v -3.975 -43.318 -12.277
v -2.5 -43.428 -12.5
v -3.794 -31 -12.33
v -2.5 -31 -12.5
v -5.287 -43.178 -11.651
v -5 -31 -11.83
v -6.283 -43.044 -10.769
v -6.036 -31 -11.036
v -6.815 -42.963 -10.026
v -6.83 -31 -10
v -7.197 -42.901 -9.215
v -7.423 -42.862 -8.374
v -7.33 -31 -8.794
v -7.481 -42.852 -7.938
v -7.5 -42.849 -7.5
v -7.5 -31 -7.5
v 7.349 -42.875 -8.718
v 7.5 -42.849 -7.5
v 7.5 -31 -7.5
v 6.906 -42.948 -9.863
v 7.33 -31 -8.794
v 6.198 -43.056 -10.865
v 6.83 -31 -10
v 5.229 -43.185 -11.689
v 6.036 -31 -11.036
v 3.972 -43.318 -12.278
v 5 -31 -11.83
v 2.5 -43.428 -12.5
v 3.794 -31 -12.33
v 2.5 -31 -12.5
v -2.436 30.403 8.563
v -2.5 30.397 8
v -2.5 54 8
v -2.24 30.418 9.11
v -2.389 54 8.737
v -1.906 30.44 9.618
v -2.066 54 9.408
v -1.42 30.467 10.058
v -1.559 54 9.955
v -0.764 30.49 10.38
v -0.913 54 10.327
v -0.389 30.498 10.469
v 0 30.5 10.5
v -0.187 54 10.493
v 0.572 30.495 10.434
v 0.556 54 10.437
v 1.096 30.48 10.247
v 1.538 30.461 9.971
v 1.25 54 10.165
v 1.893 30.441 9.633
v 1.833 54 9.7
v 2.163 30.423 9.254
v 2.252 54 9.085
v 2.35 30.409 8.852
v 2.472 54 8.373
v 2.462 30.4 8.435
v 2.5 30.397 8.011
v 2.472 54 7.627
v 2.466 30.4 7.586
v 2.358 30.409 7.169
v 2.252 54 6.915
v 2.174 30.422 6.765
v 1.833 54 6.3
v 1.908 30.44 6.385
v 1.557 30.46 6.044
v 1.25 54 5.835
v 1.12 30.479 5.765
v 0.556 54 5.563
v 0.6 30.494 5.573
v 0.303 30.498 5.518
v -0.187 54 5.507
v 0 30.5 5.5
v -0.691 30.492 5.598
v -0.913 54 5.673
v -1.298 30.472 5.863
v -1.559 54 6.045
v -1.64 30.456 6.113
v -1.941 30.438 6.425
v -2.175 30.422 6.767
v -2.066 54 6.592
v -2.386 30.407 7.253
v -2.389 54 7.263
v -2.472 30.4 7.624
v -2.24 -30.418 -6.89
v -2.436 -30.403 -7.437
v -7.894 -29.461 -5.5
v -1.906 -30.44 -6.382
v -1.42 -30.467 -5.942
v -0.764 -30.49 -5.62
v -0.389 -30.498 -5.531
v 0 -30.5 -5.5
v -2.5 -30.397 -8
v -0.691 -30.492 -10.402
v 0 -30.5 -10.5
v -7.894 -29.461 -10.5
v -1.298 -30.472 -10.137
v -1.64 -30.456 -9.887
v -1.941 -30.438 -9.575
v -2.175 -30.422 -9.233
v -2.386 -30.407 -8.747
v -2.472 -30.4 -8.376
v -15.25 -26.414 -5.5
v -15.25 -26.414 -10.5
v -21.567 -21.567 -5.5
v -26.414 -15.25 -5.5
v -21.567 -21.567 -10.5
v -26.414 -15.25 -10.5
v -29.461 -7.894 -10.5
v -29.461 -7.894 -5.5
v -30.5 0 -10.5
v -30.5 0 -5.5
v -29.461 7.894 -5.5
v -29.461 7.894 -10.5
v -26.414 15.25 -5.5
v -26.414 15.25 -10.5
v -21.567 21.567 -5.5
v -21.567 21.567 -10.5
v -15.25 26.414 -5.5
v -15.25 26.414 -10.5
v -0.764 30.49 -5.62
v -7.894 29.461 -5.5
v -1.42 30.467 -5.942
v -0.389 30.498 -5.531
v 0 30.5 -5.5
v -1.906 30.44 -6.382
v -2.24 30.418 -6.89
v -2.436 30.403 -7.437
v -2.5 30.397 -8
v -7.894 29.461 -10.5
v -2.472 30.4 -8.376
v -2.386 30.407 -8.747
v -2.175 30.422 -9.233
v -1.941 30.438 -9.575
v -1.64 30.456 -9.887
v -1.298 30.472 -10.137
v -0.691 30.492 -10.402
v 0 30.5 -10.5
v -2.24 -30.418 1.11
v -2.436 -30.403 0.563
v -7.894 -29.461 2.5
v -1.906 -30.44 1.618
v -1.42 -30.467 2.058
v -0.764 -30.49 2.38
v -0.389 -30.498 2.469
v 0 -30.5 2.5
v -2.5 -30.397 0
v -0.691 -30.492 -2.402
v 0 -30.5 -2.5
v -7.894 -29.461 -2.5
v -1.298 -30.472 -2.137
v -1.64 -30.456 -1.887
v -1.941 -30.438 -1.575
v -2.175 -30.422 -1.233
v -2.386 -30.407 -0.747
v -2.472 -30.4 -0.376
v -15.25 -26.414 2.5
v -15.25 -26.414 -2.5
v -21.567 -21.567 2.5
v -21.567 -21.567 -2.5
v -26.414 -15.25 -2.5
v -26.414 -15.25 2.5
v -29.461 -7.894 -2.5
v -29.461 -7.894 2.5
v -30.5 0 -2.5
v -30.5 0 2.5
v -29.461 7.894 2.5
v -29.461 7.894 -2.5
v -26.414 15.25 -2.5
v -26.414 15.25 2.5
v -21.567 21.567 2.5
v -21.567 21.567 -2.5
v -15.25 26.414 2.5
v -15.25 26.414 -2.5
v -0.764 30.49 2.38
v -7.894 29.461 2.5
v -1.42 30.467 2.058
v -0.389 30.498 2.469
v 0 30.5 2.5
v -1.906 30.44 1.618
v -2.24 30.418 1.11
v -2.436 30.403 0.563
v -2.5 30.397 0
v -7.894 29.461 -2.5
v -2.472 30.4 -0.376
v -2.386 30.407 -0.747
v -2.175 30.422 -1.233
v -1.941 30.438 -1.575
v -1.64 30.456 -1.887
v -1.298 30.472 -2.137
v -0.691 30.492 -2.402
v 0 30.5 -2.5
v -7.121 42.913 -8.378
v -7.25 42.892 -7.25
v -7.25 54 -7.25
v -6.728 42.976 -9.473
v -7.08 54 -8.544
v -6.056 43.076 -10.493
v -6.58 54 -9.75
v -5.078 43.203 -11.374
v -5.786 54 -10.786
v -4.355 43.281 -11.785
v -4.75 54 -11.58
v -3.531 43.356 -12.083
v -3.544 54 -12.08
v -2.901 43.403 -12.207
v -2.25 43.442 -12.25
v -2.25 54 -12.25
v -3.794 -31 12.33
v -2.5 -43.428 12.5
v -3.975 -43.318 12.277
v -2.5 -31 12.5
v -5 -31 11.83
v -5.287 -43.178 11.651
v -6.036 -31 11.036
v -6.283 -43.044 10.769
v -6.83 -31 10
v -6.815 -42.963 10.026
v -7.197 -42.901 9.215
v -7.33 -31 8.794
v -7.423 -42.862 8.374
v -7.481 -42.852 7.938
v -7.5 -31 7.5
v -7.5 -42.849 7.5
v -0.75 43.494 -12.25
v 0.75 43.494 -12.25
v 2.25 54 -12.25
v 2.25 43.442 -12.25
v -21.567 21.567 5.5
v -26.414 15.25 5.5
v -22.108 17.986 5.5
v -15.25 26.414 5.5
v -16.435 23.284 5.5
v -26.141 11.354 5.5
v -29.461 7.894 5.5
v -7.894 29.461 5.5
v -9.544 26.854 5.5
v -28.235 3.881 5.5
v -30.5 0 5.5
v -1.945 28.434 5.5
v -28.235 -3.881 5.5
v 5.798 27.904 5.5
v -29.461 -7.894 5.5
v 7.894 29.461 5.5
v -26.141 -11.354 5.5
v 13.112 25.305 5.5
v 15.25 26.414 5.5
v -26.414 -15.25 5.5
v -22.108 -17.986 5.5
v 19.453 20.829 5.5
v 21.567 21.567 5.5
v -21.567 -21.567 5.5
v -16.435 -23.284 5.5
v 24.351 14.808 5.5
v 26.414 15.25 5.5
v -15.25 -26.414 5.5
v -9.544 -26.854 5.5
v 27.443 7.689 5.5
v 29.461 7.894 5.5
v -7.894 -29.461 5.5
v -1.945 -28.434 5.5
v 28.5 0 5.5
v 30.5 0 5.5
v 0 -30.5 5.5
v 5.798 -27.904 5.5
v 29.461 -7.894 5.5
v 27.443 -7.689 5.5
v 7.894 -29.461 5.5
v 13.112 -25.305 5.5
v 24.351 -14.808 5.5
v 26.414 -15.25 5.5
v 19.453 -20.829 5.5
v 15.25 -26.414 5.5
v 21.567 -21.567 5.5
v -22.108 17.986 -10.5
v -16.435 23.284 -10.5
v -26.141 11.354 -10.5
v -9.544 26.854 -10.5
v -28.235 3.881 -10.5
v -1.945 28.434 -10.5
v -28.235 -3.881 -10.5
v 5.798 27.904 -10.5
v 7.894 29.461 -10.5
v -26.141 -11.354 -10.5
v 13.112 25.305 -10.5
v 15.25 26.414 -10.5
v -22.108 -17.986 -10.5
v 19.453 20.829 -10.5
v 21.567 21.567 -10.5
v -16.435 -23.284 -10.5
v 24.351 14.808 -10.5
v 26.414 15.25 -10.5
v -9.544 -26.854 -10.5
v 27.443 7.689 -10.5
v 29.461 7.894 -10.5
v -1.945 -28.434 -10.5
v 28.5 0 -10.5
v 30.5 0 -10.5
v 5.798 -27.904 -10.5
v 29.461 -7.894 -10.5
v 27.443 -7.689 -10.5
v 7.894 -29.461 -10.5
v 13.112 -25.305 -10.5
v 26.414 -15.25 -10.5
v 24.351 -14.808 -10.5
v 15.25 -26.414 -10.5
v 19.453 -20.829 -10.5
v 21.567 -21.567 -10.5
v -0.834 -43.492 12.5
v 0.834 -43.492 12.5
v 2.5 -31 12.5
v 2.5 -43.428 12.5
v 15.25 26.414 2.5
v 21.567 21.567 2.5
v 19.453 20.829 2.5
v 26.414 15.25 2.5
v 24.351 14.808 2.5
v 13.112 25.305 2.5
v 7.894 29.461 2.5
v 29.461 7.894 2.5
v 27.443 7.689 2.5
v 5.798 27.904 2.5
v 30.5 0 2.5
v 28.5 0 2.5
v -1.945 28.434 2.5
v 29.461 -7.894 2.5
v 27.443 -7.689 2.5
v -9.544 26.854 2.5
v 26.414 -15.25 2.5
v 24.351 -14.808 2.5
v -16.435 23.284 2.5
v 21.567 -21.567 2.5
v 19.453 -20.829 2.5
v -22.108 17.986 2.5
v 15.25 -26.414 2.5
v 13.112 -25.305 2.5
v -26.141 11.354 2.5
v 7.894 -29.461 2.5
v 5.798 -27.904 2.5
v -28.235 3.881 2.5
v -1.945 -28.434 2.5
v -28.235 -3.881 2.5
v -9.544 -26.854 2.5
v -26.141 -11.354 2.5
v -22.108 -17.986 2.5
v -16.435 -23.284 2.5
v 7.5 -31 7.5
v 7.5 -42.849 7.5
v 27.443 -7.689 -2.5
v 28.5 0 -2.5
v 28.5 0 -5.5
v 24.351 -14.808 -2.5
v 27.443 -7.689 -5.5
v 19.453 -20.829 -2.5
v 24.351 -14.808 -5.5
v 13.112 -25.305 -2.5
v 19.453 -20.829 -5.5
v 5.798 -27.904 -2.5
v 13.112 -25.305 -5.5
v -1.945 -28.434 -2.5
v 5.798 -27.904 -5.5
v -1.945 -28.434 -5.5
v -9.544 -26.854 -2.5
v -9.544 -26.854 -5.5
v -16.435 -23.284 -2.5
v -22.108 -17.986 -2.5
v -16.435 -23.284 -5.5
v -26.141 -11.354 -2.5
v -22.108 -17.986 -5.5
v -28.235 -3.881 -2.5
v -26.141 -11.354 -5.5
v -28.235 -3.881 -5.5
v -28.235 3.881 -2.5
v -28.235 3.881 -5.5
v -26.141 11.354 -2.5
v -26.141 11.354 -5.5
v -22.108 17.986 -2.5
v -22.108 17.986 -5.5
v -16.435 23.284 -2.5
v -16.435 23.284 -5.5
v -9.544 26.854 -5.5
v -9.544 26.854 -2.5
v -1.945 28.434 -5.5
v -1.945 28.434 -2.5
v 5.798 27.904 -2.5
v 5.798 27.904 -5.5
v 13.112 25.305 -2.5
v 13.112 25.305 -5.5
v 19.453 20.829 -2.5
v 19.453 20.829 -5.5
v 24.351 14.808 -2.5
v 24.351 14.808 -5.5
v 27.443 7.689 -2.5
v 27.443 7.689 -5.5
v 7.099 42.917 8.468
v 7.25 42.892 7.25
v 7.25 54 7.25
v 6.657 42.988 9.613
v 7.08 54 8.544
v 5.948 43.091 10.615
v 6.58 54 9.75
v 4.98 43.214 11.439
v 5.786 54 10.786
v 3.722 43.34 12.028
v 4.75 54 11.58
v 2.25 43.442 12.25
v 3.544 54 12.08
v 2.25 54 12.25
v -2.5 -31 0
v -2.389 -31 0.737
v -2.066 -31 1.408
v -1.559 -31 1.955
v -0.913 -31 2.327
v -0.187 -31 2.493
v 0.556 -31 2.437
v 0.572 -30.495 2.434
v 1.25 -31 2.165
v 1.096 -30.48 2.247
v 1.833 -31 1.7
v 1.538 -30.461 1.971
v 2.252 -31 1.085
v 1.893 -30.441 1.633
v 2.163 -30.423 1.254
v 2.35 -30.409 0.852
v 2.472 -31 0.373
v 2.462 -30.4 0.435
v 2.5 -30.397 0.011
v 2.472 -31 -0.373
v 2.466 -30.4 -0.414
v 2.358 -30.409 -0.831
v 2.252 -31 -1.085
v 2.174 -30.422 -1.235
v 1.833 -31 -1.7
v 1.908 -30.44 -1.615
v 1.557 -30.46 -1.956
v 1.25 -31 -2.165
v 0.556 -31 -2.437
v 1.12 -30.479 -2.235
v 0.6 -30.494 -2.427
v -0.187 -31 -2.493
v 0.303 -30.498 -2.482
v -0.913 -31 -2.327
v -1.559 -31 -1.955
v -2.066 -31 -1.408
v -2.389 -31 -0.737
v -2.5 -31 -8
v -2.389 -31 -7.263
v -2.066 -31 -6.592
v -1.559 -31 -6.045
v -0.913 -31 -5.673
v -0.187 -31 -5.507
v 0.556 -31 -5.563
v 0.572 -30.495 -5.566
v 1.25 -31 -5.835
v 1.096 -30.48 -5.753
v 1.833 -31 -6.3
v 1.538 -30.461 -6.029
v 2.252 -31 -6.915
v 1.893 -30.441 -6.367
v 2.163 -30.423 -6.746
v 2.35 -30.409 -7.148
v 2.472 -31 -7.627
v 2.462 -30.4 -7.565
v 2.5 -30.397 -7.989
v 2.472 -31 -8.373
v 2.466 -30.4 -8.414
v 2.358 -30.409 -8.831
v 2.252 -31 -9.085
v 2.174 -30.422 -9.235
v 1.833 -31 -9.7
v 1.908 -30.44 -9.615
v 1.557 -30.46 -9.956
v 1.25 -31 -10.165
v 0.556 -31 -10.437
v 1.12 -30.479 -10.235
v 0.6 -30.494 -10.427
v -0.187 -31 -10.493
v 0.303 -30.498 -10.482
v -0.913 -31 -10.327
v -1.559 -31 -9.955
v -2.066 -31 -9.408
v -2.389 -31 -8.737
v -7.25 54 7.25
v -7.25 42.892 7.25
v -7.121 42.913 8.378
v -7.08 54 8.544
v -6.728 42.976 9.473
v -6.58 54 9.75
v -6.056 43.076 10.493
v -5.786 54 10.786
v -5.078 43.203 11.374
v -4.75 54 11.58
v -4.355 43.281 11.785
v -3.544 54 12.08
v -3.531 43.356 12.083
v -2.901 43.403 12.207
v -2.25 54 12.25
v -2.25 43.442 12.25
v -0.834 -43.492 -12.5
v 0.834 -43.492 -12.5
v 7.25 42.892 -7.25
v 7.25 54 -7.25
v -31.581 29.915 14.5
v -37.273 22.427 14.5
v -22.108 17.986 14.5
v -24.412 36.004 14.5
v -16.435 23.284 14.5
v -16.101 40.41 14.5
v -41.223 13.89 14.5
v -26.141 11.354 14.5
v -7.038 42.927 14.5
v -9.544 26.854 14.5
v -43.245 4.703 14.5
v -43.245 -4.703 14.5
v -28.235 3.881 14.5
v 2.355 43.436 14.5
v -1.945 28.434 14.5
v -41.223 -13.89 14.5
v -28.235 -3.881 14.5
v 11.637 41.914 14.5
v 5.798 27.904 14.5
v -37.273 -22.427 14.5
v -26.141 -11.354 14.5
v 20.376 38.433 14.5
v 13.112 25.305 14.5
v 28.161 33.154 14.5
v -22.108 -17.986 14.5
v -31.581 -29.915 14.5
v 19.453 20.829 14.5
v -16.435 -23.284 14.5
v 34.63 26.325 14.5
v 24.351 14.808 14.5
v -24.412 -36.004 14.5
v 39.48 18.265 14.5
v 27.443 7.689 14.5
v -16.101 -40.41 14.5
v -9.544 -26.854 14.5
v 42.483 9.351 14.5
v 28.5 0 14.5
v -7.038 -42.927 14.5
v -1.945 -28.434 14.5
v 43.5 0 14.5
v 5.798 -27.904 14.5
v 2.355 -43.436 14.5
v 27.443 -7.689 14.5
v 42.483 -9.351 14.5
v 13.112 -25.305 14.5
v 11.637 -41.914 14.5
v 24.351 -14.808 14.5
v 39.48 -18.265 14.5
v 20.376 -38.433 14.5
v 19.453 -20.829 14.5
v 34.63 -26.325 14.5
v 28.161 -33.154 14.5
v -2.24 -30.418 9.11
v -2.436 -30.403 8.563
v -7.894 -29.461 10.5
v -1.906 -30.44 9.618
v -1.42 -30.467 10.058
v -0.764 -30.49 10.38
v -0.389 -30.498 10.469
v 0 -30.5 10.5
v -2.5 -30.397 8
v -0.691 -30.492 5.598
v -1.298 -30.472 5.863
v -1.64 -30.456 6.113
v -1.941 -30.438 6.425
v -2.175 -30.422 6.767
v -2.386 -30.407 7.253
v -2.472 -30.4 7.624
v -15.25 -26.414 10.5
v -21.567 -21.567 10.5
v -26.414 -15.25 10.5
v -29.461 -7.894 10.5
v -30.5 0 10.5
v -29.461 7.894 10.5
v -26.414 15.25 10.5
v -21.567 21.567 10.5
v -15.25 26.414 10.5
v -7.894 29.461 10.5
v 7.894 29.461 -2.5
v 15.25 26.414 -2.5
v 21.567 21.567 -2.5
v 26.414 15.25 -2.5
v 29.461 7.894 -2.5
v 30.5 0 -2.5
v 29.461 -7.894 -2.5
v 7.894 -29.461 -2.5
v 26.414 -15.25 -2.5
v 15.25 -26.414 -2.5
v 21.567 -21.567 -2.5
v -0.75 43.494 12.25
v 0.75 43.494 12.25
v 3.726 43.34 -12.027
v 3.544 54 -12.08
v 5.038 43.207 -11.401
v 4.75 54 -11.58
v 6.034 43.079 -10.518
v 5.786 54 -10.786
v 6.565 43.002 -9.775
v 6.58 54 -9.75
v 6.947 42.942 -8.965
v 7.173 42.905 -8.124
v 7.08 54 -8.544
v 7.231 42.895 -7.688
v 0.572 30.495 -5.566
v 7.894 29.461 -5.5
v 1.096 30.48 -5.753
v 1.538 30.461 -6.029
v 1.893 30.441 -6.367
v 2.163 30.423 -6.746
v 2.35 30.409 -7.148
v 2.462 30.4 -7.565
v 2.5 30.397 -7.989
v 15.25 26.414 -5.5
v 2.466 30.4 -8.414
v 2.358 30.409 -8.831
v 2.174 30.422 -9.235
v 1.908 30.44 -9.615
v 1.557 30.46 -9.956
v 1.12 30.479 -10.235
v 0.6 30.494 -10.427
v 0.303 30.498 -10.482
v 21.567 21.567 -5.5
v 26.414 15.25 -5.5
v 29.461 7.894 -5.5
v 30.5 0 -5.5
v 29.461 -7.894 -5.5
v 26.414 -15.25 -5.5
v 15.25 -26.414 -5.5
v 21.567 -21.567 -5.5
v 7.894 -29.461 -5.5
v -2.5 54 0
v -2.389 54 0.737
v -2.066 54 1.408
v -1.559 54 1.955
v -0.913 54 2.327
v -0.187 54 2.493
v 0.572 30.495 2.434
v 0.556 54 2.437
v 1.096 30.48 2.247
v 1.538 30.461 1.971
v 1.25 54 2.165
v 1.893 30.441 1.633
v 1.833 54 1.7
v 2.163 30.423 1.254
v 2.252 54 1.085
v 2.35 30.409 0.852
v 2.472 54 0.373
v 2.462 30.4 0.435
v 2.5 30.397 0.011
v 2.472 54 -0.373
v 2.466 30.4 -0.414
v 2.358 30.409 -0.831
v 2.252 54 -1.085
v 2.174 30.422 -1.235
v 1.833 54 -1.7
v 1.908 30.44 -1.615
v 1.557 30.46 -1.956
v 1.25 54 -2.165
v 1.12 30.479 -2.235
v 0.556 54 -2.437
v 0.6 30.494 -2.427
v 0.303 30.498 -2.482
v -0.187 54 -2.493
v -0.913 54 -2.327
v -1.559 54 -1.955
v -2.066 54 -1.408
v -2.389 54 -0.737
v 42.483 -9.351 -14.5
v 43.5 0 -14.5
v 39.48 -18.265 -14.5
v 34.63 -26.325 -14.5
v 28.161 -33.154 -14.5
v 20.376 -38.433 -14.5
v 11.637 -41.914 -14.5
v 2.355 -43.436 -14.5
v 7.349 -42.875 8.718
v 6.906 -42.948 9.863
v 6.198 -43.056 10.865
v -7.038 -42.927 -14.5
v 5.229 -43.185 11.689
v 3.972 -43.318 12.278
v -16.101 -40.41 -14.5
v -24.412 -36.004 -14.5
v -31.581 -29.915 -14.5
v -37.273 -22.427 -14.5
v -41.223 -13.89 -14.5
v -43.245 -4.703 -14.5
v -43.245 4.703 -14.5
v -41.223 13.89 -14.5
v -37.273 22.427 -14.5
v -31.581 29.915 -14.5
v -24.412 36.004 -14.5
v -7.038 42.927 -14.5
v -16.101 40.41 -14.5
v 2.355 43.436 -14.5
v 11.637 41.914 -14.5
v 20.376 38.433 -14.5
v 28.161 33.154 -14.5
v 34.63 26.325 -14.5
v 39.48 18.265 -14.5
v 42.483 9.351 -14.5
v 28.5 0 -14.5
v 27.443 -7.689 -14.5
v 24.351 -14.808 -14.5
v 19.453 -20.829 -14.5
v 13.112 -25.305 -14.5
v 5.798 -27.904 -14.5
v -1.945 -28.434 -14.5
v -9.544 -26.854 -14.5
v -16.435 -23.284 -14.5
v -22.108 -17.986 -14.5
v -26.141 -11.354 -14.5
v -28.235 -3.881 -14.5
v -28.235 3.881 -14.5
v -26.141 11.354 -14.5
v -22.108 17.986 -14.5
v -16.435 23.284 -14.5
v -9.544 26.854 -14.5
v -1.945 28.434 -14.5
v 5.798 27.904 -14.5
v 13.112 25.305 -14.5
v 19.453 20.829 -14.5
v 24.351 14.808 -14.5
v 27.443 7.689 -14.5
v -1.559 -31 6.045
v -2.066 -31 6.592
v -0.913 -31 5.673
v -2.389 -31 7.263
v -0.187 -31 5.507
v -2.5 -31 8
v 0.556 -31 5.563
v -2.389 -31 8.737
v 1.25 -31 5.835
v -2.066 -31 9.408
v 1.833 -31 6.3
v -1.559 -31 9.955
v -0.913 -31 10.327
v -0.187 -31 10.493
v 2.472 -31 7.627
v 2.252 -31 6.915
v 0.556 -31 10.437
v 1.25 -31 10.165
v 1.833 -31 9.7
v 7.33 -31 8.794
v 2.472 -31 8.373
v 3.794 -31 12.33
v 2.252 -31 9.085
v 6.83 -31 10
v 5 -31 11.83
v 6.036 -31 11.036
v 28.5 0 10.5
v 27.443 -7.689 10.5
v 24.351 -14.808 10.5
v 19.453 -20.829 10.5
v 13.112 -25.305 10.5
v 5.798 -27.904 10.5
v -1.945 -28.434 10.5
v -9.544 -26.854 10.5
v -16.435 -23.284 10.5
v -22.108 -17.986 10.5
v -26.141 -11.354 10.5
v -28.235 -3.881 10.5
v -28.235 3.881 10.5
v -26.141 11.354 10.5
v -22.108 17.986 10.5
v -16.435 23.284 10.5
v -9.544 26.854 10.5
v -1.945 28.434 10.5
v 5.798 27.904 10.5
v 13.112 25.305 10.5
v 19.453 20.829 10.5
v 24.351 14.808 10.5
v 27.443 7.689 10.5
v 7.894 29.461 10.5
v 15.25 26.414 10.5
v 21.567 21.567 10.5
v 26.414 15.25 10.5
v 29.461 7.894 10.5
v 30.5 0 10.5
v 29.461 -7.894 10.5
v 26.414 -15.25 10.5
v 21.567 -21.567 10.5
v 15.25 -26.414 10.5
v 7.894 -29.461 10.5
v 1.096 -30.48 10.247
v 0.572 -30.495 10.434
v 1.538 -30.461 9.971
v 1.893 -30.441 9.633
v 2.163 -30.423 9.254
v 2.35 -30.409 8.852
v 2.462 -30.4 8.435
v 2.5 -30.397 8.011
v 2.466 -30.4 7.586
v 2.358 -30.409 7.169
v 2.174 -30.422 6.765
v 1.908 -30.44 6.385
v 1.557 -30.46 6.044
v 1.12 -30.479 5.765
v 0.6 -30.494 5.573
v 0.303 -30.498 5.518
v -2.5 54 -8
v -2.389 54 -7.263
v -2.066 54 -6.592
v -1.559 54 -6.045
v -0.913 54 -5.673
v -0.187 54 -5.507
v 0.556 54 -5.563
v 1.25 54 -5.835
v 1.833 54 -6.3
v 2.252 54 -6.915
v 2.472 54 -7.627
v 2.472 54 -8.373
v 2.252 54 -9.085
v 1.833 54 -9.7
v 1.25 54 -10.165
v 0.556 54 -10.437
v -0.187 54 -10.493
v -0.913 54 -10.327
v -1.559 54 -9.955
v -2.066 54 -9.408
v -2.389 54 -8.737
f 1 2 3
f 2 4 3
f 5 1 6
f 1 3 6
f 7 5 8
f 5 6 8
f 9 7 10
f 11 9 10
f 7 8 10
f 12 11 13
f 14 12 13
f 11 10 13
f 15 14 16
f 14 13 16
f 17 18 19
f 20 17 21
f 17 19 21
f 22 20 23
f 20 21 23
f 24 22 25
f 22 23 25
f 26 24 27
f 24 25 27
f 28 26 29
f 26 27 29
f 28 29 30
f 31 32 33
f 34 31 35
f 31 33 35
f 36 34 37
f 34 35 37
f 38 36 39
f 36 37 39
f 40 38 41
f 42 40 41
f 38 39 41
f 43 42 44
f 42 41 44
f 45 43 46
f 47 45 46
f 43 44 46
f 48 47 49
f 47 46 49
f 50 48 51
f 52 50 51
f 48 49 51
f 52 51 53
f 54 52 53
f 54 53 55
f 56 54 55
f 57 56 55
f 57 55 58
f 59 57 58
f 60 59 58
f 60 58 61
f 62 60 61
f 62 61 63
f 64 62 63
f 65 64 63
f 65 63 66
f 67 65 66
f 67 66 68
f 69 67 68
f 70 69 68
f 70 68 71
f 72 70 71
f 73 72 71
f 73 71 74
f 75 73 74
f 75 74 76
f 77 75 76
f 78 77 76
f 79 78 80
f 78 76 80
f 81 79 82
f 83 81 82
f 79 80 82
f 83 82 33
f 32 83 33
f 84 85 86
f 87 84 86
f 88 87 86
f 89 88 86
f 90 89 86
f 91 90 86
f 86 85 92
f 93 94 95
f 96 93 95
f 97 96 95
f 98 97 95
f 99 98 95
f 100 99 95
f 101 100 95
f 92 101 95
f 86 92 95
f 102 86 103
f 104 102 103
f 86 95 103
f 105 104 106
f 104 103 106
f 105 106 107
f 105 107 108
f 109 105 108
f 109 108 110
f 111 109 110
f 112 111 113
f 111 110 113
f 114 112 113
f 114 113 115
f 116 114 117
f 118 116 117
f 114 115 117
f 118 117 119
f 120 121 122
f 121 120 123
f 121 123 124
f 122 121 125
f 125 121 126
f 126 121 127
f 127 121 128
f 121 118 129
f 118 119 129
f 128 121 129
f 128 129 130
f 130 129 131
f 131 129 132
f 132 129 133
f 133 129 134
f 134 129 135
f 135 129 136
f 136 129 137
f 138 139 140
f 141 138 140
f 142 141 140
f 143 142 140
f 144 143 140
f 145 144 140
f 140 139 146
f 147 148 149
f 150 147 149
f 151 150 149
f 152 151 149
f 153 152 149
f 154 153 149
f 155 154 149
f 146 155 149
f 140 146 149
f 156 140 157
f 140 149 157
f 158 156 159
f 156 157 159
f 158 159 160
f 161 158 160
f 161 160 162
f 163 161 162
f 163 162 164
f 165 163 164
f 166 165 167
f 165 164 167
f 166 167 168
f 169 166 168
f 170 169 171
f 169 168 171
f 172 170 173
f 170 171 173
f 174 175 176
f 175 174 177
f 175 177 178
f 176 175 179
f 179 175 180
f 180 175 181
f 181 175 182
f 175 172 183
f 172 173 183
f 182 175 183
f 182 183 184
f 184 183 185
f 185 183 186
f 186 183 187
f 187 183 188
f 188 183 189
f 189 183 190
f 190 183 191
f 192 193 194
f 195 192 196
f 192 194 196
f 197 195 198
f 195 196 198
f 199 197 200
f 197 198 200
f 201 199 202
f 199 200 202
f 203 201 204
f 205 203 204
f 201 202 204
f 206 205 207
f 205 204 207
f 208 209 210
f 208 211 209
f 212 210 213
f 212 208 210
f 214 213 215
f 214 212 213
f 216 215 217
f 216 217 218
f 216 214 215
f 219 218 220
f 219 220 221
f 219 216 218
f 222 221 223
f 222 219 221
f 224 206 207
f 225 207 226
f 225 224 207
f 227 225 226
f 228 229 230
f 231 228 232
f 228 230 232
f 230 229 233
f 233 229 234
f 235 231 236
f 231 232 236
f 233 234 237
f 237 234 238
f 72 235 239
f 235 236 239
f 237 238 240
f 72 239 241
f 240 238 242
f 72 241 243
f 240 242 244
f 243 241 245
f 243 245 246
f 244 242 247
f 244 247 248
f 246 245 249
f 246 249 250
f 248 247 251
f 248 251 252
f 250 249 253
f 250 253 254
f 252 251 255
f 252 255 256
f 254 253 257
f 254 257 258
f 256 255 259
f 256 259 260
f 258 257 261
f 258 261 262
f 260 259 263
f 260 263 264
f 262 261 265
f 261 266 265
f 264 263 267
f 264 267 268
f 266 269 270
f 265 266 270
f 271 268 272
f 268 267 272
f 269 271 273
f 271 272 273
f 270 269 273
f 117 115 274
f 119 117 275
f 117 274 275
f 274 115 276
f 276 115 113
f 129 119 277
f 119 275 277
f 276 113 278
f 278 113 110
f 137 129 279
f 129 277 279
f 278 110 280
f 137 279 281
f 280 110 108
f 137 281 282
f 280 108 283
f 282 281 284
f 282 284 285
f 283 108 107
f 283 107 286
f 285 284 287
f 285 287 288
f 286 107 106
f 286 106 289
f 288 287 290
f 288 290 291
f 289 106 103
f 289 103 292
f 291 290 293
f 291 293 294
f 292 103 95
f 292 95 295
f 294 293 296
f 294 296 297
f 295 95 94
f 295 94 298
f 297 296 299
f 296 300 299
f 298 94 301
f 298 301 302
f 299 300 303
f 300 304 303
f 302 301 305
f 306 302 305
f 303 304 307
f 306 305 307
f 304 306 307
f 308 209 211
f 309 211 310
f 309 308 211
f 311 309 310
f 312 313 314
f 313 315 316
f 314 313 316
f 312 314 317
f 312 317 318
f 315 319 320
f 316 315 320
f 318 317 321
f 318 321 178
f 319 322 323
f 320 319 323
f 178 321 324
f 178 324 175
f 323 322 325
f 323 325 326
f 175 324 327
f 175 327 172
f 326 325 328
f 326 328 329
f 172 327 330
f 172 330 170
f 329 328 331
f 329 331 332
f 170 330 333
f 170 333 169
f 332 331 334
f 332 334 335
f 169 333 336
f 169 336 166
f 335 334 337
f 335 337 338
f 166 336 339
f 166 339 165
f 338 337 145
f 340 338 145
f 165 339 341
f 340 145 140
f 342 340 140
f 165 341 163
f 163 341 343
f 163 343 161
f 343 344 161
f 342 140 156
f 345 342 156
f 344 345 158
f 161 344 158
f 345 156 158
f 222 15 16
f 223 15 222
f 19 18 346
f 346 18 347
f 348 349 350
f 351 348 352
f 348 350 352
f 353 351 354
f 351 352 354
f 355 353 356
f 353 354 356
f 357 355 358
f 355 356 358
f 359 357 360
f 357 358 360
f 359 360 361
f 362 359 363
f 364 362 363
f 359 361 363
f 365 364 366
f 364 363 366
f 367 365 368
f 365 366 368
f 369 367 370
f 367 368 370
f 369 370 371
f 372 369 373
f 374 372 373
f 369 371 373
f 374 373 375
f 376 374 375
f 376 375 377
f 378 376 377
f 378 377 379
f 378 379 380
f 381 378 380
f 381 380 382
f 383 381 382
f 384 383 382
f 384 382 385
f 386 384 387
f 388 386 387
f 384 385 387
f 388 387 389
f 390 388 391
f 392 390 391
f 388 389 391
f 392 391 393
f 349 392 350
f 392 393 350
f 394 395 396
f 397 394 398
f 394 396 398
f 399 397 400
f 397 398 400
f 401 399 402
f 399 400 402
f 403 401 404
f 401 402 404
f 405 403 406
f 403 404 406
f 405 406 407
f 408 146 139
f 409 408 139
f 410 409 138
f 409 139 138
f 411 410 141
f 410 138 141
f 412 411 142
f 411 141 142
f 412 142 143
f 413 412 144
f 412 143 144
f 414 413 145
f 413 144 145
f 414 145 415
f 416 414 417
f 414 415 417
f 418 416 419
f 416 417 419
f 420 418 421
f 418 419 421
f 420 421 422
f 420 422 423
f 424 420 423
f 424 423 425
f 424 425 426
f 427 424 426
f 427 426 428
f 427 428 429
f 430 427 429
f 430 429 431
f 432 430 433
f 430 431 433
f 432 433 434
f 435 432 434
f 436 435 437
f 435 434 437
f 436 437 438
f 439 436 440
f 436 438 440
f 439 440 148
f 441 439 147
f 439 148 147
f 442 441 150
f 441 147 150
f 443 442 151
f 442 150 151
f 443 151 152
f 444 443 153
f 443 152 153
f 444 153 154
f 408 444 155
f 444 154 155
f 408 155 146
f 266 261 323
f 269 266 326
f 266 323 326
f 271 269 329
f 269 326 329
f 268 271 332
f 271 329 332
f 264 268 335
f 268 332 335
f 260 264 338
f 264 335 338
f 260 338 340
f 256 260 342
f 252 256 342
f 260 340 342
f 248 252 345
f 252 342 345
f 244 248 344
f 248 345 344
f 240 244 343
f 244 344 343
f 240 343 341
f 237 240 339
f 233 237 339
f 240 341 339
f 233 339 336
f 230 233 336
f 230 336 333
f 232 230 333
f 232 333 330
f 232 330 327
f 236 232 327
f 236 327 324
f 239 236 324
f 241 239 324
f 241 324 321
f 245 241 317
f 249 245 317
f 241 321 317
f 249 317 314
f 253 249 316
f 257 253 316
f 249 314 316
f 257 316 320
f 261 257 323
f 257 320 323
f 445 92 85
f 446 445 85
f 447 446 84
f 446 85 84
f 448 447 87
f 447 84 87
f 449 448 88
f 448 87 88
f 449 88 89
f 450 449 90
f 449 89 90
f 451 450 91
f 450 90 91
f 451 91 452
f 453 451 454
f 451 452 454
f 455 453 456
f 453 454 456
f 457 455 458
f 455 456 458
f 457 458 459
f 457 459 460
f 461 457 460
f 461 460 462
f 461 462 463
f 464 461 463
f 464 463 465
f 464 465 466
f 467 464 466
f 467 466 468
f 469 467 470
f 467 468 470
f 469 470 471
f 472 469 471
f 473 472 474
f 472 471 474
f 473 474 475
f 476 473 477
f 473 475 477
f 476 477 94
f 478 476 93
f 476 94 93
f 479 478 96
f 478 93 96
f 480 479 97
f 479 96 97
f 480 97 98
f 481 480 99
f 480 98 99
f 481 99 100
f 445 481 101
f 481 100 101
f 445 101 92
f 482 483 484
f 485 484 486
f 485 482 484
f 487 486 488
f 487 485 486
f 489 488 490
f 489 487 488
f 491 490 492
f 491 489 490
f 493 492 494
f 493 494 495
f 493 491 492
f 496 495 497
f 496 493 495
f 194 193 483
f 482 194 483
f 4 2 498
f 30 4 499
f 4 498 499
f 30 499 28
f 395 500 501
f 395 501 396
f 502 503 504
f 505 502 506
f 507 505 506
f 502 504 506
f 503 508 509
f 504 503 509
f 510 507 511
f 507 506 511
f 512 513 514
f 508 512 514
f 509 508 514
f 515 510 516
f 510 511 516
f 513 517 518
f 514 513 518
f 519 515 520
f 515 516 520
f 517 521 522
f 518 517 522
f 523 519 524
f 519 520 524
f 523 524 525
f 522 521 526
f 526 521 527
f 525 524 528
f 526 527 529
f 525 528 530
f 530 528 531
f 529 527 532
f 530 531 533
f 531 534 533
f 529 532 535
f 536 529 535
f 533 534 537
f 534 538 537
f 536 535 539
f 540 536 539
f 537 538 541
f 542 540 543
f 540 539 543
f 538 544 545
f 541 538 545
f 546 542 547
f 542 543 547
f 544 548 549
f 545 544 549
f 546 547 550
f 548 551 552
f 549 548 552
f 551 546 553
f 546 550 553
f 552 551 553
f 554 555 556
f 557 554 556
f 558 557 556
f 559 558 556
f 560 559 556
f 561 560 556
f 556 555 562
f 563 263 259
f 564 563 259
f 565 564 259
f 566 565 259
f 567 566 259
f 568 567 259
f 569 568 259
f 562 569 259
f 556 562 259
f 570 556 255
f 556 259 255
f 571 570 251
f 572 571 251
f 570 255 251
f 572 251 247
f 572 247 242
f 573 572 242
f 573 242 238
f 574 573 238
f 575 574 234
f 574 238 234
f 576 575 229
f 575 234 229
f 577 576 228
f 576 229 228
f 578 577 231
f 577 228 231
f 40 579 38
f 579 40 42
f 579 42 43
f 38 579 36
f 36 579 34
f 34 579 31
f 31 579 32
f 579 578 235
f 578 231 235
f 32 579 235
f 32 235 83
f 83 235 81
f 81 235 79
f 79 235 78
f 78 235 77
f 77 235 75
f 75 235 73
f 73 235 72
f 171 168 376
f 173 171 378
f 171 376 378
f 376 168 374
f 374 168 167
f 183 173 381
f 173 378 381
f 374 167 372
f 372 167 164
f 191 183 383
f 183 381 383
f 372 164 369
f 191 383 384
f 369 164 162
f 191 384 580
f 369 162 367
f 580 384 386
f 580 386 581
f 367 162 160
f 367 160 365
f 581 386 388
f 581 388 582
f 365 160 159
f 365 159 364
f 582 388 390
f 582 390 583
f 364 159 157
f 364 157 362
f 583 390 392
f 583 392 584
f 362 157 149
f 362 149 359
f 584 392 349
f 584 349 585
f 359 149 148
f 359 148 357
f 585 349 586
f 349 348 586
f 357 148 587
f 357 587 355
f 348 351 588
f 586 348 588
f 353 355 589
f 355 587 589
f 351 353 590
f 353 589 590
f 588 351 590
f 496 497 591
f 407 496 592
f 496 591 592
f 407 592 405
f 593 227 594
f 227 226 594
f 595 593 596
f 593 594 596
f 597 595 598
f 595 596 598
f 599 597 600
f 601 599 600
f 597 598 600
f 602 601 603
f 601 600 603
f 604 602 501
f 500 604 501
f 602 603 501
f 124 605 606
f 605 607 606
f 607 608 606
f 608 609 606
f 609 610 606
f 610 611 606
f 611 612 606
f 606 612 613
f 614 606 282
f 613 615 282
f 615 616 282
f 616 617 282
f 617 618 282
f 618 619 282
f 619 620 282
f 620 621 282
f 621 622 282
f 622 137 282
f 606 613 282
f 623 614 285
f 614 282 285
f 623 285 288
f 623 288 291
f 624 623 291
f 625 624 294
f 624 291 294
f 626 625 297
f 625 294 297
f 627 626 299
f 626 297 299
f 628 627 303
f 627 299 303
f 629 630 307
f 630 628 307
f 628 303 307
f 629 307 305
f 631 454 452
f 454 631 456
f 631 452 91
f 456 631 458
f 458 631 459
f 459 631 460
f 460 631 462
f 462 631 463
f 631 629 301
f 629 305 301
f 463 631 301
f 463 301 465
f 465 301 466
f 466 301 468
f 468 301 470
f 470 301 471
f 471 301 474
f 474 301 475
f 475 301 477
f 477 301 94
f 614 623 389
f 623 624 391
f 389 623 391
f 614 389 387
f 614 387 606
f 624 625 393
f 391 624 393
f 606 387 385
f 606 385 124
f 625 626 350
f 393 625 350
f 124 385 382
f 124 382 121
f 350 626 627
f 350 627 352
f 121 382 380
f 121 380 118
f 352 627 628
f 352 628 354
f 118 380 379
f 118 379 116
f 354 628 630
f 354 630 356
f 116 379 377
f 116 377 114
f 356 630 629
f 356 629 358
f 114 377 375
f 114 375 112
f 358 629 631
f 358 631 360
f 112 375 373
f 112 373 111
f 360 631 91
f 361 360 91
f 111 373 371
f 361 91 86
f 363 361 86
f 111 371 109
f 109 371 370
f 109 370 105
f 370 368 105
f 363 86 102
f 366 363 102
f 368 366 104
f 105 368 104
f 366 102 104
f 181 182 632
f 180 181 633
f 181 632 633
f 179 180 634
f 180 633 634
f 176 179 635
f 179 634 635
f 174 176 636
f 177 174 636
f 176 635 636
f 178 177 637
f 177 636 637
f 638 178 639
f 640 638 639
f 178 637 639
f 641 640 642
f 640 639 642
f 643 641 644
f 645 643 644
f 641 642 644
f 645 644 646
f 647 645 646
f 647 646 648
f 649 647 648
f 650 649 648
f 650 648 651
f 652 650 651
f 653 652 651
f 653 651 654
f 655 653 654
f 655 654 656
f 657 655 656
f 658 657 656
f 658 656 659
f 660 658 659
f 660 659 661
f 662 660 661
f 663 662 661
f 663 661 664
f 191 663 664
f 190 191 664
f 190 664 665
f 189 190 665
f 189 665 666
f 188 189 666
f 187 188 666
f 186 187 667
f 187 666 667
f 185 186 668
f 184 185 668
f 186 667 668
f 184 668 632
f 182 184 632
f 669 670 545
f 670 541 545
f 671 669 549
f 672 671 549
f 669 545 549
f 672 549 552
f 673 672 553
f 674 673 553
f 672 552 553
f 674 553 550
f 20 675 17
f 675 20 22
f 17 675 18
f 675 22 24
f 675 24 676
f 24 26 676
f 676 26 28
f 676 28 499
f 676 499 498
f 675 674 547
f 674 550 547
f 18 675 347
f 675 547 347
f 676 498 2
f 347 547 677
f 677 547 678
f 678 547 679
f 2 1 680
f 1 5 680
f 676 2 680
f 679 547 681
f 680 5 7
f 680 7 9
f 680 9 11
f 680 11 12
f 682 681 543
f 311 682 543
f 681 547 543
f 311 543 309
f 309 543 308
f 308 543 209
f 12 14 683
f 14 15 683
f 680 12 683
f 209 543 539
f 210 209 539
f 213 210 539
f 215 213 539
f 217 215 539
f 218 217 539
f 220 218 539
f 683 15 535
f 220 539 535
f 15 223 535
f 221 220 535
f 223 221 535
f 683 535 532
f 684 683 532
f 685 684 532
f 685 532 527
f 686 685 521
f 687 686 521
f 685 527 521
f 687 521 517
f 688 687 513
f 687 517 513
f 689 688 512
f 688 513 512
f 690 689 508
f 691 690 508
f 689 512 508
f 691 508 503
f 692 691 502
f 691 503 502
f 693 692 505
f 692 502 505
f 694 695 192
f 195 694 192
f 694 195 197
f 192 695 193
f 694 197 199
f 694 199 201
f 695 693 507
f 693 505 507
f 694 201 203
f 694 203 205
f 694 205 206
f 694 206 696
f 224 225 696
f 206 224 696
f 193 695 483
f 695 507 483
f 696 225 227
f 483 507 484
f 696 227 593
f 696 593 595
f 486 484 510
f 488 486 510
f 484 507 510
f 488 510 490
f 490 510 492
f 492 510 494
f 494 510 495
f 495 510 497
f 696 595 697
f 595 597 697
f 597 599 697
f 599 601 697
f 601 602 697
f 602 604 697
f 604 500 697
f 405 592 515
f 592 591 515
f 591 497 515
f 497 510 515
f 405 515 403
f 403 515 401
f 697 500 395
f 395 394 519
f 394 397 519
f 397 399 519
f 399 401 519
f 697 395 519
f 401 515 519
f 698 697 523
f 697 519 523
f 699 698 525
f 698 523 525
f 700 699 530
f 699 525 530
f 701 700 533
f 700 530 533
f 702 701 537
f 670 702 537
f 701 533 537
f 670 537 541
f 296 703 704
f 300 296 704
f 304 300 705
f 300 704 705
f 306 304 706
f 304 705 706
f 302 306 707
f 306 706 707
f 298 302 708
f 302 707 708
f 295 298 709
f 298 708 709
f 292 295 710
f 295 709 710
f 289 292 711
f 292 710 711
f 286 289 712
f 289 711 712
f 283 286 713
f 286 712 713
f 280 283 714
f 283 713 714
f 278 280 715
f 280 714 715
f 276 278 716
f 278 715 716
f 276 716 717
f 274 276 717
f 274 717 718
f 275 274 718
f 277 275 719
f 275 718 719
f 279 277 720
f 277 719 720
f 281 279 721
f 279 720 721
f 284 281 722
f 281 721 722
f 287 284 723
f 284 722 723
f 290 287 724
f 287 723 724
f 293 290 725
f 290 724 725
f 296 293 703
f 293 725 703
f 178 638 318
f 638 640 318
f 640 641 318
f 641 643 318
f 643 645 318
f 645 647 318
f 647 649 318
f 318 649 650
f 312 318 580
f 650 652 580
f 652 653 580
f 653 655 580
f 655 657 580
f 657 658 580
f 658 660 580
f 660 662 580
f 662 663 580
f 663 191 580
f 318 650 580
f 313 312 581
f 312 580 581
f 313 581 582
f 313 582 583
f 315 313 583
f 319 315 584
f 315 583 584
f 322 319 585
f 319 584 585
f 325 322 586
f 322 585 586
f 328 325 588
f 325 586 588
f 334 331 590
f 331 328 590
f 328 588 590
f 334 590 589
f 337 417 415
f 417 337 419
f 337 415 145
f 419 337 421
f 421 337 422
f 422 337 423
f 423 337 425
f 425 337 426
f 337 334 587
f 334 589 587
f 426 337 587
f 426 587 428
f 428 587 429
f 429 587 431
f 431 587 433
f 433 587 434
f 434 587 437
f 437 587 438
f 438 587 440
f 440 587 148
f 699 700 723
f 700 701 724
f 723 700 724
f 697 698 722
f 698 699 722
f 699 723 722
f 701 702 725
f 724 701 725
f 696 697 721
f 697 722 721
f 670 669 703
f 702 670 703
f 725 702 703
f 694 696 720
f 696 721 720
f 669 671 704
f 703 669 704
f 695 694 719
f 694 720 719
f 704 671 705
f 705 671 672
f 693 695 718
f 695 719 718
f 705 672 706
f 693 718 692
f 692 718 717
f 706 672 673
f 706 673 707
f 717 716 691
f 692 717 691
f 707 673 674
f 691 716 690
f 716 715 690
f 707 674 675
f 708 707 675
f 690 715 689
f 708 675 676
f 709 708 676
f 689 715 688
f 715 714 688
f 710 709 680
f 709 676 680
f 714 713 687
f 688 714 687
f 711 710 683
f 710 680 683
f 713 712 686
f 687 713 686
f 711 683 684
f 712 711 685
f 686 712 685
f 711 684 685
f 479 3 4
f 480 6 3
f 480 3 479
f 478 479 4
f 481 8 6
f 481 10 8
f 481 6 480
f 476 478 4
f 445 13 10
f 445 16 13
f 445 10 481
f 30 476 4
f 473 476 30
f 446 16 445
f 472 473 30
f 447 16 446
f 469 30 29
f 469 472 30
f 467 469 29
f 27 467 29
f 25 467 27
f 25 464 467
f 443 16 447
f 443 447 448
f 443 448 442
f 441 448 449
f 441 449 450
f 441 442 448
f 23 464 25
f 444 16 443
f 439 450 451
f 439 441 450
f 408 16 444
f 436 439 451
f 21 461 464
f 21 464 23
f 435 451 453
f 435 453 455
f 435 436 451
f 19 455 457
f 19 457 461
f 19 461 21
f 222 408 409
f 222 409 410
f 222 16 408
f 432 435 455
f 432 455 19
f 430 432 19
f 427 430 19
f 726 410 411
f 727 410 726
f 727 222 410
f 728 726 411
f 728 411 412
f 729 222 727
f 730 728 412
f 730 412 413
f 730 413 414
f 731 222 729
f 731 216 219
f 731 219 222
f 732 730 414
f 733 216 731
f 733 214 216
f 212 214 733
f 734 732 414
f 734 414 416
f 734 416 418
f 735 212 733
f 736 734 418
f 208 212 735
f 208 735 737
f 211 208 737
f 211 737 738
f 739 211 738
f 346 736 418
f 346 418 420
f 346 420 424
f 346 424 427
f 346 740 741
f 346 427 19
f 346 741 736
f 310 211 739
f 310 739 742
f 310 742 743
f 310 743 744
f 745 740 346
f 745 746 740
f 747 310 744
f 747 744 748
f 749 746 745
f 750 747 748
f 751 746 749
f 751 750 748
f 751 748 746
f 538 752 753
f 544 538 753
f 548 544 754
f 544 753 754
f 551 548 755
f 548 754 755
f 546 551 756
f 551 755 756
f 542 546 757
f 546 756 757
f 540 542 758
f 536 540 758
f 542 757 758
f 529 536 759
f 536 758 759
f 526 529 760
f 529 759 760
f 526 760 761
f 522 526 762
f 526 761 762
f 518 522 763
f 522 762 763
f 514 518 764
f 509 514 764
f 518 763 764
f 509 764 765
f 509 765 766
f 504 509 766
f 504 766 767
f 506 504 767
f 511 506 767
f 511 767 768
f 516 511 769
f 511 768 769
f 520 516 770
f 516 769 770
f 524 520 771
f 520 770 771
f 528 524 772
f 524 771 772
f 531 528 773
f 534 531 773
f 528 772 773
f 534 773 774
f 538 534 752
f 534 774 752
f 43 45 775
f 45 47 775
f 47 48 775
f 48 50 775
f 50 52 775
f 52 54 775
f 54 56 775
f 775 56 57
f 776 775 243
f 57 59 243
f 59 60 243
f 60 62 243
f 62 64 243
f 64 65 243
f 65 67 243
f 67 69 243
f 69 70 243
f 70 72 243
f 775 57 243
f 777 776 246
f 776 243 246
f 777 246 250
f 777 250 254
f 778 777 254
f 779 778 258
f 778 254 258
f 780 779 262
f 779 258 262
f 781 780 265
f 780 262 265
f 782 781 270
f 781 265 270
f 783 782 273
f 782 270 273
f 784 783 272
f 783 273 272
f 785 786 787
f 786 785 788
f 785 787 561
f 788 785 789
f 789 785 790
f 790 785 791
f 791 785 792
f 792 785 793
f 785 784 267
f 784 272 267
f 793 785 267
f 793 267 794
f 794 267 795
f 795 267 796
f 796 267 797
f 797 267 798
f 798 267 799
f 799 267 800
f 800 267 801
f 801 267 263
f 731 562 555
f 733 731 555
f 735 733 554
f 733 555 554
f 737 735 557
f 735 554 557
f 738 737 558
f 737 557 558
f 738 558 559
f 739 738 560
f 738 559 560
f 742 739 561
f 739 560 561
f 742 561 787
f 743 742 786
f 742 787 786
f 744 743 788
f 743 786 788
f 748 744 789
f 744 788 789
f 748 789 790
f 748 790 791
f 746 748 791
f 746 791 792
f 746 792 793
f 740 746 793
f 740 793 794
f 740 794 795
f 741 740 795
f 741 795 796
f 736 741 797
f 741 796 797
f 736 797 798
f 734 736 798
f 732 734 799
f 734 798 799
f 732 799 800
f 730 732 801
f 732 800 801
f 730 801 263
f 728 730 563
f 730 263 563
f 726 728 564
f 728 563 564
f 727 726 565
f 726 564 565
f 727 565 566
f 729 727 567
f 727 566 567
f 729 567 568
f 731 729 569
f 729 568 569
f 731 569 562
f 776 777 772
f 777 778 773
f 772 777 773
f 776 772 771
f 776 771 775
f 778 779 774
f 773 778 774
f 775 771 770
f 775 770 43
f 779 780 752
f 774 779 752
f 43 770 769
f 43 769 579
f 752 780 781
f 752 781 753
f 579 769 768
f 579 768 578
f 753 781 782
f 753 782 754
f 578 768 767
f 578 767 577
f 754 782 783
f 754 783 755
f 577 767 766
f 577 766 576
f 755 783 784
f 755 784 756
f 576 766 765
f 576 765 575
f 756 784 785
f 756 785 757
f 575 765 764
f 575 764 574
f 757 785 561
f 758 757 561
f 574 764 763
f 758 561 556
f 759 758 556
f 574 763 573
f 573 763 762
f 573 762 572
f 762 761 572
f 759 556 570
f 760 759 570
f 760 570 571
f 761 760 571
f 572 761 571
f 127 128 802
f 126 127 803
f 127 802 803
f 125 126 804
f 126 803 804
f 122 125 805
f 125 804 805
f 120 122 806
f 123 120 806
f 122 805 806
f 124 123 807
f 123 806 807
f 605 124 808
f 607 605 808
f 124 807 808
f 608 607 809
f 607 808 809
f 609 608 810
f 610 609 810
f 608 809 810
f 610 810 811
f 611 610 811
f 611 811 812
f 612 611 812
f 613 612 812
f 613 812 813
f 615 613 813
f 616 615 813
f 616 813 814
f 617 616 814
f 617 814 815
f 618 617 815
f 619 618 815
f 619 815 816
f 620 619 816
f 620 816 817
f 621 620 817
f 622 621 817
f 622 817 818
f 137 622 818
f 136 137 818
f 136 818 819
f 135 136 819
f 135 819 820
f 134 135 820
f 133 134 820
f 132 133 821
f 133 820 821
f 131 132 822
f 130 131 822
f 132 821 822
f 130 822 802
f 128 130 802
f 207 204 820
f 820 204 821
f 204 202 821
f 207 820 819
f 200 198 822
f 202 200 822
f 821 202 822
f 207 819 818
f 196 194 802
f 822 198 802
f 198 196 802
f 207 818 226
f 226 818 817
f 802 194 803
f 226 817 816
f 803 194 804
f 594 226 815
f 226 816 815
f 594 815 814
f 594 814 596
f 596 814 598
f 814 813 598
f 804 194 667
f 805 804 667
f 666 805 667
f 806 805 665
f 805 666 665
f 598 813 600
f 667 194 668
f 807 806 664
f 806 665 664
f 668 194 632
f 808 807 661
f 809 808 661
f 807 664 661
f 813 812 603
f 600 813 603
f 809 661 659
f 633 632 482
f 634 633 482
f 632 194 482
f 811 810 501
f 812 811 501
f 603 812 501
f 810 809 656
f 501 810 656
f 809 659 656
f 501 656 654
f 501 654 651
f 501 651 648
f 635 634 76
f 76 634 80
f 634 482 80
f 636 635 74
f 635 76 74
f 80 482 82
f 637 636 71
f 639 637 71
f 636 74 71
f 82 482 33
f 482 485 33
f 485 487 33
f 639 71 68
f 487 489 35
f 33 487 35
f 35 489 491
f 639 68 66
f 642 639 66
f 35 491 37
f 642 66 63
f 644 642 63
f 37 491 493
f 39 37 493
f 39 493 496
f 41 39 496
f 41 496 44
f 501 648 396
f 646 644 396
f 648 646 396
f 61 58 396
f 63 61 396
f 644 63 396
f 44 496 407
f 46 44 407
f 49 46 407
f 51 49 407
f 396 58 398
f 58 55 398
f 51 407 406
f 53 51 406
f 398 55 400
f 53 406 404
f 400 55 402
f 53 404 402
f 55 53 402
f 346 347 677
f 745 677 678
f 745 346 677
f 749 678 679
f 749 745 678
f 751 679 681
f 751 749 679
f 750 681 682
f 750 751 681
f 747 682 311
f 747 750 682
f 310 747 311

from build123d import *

# Parameters (mm, degrees)
F3_W     = 15
F3_H     = 25
F4_DEPTH = 12.5
F6_W     = 14.5
F6_H     = 24.5
F7_DEPTH = 14
F8_D     = 5
F9_R     = 5


with BuildPart() as f1:
    # F0 (on Front) → F1 (revolve)
    with BuildSketch(Plane.XZ):
        Polygon((43.5, 14.5), (28.5, 14.5), (28.5, 10.5), (30.5, 10.5), (30.5, 5.5), (28.5, 5.5), (28.5, 2.5), (30.5, 2.5), (30.5, -2.5), (28.5, -2.5), (28.5, -5.5), (30.5, -5.5), (30.5, -10.5), (28.5, -10.5), (28.5, -14.5), (43.5, -14.5), align=None)
    revolve(axis=Axis((0, 0, 1.261241), (0, 0, -1)))

    # F3 (on offset) → F4 (cut)
    with BuildSketch(Plane.XZ.offset(43.5)):
        Rectangle(F3_W, F3_H)
    extrude(amount=-F4_DEPTH, mode=Mode.SUBTRACT)

    # F6 (on offset) → F7 (join)
    with BuildSketch(Plane.XZ.offset(-40)):
        Rectangle(F6_W, F6_H)
    extrude(amount=-F7_DEPTH)

    # F8 (through all)
    with Locations(Plane.XZ.offset(43.5)):
        with Locations((0, 8), (0, 0), (0, -8)):
            Hole(F8_D / 2)

    # F9
    f9_edges = [f1.edges().sort_by_distance(p)[0] for p in [
        (-7.5, -36.924285, 12.5),
        (7.5, -36.924285, 12.5),
        (-7.5, -36.924285, -12.5),
        (7.5, -36.924285, -12.5),
        (7.25, 48.445789, 12.25),
        (-7.25, 48.445789, 12.25),
        (7.25, 48.445789, -12.25),
        (-7.25, 48.445789, -12.25),
    ]]
    fillet(f9_edges, radius=F9_R)


solid = f1.part
